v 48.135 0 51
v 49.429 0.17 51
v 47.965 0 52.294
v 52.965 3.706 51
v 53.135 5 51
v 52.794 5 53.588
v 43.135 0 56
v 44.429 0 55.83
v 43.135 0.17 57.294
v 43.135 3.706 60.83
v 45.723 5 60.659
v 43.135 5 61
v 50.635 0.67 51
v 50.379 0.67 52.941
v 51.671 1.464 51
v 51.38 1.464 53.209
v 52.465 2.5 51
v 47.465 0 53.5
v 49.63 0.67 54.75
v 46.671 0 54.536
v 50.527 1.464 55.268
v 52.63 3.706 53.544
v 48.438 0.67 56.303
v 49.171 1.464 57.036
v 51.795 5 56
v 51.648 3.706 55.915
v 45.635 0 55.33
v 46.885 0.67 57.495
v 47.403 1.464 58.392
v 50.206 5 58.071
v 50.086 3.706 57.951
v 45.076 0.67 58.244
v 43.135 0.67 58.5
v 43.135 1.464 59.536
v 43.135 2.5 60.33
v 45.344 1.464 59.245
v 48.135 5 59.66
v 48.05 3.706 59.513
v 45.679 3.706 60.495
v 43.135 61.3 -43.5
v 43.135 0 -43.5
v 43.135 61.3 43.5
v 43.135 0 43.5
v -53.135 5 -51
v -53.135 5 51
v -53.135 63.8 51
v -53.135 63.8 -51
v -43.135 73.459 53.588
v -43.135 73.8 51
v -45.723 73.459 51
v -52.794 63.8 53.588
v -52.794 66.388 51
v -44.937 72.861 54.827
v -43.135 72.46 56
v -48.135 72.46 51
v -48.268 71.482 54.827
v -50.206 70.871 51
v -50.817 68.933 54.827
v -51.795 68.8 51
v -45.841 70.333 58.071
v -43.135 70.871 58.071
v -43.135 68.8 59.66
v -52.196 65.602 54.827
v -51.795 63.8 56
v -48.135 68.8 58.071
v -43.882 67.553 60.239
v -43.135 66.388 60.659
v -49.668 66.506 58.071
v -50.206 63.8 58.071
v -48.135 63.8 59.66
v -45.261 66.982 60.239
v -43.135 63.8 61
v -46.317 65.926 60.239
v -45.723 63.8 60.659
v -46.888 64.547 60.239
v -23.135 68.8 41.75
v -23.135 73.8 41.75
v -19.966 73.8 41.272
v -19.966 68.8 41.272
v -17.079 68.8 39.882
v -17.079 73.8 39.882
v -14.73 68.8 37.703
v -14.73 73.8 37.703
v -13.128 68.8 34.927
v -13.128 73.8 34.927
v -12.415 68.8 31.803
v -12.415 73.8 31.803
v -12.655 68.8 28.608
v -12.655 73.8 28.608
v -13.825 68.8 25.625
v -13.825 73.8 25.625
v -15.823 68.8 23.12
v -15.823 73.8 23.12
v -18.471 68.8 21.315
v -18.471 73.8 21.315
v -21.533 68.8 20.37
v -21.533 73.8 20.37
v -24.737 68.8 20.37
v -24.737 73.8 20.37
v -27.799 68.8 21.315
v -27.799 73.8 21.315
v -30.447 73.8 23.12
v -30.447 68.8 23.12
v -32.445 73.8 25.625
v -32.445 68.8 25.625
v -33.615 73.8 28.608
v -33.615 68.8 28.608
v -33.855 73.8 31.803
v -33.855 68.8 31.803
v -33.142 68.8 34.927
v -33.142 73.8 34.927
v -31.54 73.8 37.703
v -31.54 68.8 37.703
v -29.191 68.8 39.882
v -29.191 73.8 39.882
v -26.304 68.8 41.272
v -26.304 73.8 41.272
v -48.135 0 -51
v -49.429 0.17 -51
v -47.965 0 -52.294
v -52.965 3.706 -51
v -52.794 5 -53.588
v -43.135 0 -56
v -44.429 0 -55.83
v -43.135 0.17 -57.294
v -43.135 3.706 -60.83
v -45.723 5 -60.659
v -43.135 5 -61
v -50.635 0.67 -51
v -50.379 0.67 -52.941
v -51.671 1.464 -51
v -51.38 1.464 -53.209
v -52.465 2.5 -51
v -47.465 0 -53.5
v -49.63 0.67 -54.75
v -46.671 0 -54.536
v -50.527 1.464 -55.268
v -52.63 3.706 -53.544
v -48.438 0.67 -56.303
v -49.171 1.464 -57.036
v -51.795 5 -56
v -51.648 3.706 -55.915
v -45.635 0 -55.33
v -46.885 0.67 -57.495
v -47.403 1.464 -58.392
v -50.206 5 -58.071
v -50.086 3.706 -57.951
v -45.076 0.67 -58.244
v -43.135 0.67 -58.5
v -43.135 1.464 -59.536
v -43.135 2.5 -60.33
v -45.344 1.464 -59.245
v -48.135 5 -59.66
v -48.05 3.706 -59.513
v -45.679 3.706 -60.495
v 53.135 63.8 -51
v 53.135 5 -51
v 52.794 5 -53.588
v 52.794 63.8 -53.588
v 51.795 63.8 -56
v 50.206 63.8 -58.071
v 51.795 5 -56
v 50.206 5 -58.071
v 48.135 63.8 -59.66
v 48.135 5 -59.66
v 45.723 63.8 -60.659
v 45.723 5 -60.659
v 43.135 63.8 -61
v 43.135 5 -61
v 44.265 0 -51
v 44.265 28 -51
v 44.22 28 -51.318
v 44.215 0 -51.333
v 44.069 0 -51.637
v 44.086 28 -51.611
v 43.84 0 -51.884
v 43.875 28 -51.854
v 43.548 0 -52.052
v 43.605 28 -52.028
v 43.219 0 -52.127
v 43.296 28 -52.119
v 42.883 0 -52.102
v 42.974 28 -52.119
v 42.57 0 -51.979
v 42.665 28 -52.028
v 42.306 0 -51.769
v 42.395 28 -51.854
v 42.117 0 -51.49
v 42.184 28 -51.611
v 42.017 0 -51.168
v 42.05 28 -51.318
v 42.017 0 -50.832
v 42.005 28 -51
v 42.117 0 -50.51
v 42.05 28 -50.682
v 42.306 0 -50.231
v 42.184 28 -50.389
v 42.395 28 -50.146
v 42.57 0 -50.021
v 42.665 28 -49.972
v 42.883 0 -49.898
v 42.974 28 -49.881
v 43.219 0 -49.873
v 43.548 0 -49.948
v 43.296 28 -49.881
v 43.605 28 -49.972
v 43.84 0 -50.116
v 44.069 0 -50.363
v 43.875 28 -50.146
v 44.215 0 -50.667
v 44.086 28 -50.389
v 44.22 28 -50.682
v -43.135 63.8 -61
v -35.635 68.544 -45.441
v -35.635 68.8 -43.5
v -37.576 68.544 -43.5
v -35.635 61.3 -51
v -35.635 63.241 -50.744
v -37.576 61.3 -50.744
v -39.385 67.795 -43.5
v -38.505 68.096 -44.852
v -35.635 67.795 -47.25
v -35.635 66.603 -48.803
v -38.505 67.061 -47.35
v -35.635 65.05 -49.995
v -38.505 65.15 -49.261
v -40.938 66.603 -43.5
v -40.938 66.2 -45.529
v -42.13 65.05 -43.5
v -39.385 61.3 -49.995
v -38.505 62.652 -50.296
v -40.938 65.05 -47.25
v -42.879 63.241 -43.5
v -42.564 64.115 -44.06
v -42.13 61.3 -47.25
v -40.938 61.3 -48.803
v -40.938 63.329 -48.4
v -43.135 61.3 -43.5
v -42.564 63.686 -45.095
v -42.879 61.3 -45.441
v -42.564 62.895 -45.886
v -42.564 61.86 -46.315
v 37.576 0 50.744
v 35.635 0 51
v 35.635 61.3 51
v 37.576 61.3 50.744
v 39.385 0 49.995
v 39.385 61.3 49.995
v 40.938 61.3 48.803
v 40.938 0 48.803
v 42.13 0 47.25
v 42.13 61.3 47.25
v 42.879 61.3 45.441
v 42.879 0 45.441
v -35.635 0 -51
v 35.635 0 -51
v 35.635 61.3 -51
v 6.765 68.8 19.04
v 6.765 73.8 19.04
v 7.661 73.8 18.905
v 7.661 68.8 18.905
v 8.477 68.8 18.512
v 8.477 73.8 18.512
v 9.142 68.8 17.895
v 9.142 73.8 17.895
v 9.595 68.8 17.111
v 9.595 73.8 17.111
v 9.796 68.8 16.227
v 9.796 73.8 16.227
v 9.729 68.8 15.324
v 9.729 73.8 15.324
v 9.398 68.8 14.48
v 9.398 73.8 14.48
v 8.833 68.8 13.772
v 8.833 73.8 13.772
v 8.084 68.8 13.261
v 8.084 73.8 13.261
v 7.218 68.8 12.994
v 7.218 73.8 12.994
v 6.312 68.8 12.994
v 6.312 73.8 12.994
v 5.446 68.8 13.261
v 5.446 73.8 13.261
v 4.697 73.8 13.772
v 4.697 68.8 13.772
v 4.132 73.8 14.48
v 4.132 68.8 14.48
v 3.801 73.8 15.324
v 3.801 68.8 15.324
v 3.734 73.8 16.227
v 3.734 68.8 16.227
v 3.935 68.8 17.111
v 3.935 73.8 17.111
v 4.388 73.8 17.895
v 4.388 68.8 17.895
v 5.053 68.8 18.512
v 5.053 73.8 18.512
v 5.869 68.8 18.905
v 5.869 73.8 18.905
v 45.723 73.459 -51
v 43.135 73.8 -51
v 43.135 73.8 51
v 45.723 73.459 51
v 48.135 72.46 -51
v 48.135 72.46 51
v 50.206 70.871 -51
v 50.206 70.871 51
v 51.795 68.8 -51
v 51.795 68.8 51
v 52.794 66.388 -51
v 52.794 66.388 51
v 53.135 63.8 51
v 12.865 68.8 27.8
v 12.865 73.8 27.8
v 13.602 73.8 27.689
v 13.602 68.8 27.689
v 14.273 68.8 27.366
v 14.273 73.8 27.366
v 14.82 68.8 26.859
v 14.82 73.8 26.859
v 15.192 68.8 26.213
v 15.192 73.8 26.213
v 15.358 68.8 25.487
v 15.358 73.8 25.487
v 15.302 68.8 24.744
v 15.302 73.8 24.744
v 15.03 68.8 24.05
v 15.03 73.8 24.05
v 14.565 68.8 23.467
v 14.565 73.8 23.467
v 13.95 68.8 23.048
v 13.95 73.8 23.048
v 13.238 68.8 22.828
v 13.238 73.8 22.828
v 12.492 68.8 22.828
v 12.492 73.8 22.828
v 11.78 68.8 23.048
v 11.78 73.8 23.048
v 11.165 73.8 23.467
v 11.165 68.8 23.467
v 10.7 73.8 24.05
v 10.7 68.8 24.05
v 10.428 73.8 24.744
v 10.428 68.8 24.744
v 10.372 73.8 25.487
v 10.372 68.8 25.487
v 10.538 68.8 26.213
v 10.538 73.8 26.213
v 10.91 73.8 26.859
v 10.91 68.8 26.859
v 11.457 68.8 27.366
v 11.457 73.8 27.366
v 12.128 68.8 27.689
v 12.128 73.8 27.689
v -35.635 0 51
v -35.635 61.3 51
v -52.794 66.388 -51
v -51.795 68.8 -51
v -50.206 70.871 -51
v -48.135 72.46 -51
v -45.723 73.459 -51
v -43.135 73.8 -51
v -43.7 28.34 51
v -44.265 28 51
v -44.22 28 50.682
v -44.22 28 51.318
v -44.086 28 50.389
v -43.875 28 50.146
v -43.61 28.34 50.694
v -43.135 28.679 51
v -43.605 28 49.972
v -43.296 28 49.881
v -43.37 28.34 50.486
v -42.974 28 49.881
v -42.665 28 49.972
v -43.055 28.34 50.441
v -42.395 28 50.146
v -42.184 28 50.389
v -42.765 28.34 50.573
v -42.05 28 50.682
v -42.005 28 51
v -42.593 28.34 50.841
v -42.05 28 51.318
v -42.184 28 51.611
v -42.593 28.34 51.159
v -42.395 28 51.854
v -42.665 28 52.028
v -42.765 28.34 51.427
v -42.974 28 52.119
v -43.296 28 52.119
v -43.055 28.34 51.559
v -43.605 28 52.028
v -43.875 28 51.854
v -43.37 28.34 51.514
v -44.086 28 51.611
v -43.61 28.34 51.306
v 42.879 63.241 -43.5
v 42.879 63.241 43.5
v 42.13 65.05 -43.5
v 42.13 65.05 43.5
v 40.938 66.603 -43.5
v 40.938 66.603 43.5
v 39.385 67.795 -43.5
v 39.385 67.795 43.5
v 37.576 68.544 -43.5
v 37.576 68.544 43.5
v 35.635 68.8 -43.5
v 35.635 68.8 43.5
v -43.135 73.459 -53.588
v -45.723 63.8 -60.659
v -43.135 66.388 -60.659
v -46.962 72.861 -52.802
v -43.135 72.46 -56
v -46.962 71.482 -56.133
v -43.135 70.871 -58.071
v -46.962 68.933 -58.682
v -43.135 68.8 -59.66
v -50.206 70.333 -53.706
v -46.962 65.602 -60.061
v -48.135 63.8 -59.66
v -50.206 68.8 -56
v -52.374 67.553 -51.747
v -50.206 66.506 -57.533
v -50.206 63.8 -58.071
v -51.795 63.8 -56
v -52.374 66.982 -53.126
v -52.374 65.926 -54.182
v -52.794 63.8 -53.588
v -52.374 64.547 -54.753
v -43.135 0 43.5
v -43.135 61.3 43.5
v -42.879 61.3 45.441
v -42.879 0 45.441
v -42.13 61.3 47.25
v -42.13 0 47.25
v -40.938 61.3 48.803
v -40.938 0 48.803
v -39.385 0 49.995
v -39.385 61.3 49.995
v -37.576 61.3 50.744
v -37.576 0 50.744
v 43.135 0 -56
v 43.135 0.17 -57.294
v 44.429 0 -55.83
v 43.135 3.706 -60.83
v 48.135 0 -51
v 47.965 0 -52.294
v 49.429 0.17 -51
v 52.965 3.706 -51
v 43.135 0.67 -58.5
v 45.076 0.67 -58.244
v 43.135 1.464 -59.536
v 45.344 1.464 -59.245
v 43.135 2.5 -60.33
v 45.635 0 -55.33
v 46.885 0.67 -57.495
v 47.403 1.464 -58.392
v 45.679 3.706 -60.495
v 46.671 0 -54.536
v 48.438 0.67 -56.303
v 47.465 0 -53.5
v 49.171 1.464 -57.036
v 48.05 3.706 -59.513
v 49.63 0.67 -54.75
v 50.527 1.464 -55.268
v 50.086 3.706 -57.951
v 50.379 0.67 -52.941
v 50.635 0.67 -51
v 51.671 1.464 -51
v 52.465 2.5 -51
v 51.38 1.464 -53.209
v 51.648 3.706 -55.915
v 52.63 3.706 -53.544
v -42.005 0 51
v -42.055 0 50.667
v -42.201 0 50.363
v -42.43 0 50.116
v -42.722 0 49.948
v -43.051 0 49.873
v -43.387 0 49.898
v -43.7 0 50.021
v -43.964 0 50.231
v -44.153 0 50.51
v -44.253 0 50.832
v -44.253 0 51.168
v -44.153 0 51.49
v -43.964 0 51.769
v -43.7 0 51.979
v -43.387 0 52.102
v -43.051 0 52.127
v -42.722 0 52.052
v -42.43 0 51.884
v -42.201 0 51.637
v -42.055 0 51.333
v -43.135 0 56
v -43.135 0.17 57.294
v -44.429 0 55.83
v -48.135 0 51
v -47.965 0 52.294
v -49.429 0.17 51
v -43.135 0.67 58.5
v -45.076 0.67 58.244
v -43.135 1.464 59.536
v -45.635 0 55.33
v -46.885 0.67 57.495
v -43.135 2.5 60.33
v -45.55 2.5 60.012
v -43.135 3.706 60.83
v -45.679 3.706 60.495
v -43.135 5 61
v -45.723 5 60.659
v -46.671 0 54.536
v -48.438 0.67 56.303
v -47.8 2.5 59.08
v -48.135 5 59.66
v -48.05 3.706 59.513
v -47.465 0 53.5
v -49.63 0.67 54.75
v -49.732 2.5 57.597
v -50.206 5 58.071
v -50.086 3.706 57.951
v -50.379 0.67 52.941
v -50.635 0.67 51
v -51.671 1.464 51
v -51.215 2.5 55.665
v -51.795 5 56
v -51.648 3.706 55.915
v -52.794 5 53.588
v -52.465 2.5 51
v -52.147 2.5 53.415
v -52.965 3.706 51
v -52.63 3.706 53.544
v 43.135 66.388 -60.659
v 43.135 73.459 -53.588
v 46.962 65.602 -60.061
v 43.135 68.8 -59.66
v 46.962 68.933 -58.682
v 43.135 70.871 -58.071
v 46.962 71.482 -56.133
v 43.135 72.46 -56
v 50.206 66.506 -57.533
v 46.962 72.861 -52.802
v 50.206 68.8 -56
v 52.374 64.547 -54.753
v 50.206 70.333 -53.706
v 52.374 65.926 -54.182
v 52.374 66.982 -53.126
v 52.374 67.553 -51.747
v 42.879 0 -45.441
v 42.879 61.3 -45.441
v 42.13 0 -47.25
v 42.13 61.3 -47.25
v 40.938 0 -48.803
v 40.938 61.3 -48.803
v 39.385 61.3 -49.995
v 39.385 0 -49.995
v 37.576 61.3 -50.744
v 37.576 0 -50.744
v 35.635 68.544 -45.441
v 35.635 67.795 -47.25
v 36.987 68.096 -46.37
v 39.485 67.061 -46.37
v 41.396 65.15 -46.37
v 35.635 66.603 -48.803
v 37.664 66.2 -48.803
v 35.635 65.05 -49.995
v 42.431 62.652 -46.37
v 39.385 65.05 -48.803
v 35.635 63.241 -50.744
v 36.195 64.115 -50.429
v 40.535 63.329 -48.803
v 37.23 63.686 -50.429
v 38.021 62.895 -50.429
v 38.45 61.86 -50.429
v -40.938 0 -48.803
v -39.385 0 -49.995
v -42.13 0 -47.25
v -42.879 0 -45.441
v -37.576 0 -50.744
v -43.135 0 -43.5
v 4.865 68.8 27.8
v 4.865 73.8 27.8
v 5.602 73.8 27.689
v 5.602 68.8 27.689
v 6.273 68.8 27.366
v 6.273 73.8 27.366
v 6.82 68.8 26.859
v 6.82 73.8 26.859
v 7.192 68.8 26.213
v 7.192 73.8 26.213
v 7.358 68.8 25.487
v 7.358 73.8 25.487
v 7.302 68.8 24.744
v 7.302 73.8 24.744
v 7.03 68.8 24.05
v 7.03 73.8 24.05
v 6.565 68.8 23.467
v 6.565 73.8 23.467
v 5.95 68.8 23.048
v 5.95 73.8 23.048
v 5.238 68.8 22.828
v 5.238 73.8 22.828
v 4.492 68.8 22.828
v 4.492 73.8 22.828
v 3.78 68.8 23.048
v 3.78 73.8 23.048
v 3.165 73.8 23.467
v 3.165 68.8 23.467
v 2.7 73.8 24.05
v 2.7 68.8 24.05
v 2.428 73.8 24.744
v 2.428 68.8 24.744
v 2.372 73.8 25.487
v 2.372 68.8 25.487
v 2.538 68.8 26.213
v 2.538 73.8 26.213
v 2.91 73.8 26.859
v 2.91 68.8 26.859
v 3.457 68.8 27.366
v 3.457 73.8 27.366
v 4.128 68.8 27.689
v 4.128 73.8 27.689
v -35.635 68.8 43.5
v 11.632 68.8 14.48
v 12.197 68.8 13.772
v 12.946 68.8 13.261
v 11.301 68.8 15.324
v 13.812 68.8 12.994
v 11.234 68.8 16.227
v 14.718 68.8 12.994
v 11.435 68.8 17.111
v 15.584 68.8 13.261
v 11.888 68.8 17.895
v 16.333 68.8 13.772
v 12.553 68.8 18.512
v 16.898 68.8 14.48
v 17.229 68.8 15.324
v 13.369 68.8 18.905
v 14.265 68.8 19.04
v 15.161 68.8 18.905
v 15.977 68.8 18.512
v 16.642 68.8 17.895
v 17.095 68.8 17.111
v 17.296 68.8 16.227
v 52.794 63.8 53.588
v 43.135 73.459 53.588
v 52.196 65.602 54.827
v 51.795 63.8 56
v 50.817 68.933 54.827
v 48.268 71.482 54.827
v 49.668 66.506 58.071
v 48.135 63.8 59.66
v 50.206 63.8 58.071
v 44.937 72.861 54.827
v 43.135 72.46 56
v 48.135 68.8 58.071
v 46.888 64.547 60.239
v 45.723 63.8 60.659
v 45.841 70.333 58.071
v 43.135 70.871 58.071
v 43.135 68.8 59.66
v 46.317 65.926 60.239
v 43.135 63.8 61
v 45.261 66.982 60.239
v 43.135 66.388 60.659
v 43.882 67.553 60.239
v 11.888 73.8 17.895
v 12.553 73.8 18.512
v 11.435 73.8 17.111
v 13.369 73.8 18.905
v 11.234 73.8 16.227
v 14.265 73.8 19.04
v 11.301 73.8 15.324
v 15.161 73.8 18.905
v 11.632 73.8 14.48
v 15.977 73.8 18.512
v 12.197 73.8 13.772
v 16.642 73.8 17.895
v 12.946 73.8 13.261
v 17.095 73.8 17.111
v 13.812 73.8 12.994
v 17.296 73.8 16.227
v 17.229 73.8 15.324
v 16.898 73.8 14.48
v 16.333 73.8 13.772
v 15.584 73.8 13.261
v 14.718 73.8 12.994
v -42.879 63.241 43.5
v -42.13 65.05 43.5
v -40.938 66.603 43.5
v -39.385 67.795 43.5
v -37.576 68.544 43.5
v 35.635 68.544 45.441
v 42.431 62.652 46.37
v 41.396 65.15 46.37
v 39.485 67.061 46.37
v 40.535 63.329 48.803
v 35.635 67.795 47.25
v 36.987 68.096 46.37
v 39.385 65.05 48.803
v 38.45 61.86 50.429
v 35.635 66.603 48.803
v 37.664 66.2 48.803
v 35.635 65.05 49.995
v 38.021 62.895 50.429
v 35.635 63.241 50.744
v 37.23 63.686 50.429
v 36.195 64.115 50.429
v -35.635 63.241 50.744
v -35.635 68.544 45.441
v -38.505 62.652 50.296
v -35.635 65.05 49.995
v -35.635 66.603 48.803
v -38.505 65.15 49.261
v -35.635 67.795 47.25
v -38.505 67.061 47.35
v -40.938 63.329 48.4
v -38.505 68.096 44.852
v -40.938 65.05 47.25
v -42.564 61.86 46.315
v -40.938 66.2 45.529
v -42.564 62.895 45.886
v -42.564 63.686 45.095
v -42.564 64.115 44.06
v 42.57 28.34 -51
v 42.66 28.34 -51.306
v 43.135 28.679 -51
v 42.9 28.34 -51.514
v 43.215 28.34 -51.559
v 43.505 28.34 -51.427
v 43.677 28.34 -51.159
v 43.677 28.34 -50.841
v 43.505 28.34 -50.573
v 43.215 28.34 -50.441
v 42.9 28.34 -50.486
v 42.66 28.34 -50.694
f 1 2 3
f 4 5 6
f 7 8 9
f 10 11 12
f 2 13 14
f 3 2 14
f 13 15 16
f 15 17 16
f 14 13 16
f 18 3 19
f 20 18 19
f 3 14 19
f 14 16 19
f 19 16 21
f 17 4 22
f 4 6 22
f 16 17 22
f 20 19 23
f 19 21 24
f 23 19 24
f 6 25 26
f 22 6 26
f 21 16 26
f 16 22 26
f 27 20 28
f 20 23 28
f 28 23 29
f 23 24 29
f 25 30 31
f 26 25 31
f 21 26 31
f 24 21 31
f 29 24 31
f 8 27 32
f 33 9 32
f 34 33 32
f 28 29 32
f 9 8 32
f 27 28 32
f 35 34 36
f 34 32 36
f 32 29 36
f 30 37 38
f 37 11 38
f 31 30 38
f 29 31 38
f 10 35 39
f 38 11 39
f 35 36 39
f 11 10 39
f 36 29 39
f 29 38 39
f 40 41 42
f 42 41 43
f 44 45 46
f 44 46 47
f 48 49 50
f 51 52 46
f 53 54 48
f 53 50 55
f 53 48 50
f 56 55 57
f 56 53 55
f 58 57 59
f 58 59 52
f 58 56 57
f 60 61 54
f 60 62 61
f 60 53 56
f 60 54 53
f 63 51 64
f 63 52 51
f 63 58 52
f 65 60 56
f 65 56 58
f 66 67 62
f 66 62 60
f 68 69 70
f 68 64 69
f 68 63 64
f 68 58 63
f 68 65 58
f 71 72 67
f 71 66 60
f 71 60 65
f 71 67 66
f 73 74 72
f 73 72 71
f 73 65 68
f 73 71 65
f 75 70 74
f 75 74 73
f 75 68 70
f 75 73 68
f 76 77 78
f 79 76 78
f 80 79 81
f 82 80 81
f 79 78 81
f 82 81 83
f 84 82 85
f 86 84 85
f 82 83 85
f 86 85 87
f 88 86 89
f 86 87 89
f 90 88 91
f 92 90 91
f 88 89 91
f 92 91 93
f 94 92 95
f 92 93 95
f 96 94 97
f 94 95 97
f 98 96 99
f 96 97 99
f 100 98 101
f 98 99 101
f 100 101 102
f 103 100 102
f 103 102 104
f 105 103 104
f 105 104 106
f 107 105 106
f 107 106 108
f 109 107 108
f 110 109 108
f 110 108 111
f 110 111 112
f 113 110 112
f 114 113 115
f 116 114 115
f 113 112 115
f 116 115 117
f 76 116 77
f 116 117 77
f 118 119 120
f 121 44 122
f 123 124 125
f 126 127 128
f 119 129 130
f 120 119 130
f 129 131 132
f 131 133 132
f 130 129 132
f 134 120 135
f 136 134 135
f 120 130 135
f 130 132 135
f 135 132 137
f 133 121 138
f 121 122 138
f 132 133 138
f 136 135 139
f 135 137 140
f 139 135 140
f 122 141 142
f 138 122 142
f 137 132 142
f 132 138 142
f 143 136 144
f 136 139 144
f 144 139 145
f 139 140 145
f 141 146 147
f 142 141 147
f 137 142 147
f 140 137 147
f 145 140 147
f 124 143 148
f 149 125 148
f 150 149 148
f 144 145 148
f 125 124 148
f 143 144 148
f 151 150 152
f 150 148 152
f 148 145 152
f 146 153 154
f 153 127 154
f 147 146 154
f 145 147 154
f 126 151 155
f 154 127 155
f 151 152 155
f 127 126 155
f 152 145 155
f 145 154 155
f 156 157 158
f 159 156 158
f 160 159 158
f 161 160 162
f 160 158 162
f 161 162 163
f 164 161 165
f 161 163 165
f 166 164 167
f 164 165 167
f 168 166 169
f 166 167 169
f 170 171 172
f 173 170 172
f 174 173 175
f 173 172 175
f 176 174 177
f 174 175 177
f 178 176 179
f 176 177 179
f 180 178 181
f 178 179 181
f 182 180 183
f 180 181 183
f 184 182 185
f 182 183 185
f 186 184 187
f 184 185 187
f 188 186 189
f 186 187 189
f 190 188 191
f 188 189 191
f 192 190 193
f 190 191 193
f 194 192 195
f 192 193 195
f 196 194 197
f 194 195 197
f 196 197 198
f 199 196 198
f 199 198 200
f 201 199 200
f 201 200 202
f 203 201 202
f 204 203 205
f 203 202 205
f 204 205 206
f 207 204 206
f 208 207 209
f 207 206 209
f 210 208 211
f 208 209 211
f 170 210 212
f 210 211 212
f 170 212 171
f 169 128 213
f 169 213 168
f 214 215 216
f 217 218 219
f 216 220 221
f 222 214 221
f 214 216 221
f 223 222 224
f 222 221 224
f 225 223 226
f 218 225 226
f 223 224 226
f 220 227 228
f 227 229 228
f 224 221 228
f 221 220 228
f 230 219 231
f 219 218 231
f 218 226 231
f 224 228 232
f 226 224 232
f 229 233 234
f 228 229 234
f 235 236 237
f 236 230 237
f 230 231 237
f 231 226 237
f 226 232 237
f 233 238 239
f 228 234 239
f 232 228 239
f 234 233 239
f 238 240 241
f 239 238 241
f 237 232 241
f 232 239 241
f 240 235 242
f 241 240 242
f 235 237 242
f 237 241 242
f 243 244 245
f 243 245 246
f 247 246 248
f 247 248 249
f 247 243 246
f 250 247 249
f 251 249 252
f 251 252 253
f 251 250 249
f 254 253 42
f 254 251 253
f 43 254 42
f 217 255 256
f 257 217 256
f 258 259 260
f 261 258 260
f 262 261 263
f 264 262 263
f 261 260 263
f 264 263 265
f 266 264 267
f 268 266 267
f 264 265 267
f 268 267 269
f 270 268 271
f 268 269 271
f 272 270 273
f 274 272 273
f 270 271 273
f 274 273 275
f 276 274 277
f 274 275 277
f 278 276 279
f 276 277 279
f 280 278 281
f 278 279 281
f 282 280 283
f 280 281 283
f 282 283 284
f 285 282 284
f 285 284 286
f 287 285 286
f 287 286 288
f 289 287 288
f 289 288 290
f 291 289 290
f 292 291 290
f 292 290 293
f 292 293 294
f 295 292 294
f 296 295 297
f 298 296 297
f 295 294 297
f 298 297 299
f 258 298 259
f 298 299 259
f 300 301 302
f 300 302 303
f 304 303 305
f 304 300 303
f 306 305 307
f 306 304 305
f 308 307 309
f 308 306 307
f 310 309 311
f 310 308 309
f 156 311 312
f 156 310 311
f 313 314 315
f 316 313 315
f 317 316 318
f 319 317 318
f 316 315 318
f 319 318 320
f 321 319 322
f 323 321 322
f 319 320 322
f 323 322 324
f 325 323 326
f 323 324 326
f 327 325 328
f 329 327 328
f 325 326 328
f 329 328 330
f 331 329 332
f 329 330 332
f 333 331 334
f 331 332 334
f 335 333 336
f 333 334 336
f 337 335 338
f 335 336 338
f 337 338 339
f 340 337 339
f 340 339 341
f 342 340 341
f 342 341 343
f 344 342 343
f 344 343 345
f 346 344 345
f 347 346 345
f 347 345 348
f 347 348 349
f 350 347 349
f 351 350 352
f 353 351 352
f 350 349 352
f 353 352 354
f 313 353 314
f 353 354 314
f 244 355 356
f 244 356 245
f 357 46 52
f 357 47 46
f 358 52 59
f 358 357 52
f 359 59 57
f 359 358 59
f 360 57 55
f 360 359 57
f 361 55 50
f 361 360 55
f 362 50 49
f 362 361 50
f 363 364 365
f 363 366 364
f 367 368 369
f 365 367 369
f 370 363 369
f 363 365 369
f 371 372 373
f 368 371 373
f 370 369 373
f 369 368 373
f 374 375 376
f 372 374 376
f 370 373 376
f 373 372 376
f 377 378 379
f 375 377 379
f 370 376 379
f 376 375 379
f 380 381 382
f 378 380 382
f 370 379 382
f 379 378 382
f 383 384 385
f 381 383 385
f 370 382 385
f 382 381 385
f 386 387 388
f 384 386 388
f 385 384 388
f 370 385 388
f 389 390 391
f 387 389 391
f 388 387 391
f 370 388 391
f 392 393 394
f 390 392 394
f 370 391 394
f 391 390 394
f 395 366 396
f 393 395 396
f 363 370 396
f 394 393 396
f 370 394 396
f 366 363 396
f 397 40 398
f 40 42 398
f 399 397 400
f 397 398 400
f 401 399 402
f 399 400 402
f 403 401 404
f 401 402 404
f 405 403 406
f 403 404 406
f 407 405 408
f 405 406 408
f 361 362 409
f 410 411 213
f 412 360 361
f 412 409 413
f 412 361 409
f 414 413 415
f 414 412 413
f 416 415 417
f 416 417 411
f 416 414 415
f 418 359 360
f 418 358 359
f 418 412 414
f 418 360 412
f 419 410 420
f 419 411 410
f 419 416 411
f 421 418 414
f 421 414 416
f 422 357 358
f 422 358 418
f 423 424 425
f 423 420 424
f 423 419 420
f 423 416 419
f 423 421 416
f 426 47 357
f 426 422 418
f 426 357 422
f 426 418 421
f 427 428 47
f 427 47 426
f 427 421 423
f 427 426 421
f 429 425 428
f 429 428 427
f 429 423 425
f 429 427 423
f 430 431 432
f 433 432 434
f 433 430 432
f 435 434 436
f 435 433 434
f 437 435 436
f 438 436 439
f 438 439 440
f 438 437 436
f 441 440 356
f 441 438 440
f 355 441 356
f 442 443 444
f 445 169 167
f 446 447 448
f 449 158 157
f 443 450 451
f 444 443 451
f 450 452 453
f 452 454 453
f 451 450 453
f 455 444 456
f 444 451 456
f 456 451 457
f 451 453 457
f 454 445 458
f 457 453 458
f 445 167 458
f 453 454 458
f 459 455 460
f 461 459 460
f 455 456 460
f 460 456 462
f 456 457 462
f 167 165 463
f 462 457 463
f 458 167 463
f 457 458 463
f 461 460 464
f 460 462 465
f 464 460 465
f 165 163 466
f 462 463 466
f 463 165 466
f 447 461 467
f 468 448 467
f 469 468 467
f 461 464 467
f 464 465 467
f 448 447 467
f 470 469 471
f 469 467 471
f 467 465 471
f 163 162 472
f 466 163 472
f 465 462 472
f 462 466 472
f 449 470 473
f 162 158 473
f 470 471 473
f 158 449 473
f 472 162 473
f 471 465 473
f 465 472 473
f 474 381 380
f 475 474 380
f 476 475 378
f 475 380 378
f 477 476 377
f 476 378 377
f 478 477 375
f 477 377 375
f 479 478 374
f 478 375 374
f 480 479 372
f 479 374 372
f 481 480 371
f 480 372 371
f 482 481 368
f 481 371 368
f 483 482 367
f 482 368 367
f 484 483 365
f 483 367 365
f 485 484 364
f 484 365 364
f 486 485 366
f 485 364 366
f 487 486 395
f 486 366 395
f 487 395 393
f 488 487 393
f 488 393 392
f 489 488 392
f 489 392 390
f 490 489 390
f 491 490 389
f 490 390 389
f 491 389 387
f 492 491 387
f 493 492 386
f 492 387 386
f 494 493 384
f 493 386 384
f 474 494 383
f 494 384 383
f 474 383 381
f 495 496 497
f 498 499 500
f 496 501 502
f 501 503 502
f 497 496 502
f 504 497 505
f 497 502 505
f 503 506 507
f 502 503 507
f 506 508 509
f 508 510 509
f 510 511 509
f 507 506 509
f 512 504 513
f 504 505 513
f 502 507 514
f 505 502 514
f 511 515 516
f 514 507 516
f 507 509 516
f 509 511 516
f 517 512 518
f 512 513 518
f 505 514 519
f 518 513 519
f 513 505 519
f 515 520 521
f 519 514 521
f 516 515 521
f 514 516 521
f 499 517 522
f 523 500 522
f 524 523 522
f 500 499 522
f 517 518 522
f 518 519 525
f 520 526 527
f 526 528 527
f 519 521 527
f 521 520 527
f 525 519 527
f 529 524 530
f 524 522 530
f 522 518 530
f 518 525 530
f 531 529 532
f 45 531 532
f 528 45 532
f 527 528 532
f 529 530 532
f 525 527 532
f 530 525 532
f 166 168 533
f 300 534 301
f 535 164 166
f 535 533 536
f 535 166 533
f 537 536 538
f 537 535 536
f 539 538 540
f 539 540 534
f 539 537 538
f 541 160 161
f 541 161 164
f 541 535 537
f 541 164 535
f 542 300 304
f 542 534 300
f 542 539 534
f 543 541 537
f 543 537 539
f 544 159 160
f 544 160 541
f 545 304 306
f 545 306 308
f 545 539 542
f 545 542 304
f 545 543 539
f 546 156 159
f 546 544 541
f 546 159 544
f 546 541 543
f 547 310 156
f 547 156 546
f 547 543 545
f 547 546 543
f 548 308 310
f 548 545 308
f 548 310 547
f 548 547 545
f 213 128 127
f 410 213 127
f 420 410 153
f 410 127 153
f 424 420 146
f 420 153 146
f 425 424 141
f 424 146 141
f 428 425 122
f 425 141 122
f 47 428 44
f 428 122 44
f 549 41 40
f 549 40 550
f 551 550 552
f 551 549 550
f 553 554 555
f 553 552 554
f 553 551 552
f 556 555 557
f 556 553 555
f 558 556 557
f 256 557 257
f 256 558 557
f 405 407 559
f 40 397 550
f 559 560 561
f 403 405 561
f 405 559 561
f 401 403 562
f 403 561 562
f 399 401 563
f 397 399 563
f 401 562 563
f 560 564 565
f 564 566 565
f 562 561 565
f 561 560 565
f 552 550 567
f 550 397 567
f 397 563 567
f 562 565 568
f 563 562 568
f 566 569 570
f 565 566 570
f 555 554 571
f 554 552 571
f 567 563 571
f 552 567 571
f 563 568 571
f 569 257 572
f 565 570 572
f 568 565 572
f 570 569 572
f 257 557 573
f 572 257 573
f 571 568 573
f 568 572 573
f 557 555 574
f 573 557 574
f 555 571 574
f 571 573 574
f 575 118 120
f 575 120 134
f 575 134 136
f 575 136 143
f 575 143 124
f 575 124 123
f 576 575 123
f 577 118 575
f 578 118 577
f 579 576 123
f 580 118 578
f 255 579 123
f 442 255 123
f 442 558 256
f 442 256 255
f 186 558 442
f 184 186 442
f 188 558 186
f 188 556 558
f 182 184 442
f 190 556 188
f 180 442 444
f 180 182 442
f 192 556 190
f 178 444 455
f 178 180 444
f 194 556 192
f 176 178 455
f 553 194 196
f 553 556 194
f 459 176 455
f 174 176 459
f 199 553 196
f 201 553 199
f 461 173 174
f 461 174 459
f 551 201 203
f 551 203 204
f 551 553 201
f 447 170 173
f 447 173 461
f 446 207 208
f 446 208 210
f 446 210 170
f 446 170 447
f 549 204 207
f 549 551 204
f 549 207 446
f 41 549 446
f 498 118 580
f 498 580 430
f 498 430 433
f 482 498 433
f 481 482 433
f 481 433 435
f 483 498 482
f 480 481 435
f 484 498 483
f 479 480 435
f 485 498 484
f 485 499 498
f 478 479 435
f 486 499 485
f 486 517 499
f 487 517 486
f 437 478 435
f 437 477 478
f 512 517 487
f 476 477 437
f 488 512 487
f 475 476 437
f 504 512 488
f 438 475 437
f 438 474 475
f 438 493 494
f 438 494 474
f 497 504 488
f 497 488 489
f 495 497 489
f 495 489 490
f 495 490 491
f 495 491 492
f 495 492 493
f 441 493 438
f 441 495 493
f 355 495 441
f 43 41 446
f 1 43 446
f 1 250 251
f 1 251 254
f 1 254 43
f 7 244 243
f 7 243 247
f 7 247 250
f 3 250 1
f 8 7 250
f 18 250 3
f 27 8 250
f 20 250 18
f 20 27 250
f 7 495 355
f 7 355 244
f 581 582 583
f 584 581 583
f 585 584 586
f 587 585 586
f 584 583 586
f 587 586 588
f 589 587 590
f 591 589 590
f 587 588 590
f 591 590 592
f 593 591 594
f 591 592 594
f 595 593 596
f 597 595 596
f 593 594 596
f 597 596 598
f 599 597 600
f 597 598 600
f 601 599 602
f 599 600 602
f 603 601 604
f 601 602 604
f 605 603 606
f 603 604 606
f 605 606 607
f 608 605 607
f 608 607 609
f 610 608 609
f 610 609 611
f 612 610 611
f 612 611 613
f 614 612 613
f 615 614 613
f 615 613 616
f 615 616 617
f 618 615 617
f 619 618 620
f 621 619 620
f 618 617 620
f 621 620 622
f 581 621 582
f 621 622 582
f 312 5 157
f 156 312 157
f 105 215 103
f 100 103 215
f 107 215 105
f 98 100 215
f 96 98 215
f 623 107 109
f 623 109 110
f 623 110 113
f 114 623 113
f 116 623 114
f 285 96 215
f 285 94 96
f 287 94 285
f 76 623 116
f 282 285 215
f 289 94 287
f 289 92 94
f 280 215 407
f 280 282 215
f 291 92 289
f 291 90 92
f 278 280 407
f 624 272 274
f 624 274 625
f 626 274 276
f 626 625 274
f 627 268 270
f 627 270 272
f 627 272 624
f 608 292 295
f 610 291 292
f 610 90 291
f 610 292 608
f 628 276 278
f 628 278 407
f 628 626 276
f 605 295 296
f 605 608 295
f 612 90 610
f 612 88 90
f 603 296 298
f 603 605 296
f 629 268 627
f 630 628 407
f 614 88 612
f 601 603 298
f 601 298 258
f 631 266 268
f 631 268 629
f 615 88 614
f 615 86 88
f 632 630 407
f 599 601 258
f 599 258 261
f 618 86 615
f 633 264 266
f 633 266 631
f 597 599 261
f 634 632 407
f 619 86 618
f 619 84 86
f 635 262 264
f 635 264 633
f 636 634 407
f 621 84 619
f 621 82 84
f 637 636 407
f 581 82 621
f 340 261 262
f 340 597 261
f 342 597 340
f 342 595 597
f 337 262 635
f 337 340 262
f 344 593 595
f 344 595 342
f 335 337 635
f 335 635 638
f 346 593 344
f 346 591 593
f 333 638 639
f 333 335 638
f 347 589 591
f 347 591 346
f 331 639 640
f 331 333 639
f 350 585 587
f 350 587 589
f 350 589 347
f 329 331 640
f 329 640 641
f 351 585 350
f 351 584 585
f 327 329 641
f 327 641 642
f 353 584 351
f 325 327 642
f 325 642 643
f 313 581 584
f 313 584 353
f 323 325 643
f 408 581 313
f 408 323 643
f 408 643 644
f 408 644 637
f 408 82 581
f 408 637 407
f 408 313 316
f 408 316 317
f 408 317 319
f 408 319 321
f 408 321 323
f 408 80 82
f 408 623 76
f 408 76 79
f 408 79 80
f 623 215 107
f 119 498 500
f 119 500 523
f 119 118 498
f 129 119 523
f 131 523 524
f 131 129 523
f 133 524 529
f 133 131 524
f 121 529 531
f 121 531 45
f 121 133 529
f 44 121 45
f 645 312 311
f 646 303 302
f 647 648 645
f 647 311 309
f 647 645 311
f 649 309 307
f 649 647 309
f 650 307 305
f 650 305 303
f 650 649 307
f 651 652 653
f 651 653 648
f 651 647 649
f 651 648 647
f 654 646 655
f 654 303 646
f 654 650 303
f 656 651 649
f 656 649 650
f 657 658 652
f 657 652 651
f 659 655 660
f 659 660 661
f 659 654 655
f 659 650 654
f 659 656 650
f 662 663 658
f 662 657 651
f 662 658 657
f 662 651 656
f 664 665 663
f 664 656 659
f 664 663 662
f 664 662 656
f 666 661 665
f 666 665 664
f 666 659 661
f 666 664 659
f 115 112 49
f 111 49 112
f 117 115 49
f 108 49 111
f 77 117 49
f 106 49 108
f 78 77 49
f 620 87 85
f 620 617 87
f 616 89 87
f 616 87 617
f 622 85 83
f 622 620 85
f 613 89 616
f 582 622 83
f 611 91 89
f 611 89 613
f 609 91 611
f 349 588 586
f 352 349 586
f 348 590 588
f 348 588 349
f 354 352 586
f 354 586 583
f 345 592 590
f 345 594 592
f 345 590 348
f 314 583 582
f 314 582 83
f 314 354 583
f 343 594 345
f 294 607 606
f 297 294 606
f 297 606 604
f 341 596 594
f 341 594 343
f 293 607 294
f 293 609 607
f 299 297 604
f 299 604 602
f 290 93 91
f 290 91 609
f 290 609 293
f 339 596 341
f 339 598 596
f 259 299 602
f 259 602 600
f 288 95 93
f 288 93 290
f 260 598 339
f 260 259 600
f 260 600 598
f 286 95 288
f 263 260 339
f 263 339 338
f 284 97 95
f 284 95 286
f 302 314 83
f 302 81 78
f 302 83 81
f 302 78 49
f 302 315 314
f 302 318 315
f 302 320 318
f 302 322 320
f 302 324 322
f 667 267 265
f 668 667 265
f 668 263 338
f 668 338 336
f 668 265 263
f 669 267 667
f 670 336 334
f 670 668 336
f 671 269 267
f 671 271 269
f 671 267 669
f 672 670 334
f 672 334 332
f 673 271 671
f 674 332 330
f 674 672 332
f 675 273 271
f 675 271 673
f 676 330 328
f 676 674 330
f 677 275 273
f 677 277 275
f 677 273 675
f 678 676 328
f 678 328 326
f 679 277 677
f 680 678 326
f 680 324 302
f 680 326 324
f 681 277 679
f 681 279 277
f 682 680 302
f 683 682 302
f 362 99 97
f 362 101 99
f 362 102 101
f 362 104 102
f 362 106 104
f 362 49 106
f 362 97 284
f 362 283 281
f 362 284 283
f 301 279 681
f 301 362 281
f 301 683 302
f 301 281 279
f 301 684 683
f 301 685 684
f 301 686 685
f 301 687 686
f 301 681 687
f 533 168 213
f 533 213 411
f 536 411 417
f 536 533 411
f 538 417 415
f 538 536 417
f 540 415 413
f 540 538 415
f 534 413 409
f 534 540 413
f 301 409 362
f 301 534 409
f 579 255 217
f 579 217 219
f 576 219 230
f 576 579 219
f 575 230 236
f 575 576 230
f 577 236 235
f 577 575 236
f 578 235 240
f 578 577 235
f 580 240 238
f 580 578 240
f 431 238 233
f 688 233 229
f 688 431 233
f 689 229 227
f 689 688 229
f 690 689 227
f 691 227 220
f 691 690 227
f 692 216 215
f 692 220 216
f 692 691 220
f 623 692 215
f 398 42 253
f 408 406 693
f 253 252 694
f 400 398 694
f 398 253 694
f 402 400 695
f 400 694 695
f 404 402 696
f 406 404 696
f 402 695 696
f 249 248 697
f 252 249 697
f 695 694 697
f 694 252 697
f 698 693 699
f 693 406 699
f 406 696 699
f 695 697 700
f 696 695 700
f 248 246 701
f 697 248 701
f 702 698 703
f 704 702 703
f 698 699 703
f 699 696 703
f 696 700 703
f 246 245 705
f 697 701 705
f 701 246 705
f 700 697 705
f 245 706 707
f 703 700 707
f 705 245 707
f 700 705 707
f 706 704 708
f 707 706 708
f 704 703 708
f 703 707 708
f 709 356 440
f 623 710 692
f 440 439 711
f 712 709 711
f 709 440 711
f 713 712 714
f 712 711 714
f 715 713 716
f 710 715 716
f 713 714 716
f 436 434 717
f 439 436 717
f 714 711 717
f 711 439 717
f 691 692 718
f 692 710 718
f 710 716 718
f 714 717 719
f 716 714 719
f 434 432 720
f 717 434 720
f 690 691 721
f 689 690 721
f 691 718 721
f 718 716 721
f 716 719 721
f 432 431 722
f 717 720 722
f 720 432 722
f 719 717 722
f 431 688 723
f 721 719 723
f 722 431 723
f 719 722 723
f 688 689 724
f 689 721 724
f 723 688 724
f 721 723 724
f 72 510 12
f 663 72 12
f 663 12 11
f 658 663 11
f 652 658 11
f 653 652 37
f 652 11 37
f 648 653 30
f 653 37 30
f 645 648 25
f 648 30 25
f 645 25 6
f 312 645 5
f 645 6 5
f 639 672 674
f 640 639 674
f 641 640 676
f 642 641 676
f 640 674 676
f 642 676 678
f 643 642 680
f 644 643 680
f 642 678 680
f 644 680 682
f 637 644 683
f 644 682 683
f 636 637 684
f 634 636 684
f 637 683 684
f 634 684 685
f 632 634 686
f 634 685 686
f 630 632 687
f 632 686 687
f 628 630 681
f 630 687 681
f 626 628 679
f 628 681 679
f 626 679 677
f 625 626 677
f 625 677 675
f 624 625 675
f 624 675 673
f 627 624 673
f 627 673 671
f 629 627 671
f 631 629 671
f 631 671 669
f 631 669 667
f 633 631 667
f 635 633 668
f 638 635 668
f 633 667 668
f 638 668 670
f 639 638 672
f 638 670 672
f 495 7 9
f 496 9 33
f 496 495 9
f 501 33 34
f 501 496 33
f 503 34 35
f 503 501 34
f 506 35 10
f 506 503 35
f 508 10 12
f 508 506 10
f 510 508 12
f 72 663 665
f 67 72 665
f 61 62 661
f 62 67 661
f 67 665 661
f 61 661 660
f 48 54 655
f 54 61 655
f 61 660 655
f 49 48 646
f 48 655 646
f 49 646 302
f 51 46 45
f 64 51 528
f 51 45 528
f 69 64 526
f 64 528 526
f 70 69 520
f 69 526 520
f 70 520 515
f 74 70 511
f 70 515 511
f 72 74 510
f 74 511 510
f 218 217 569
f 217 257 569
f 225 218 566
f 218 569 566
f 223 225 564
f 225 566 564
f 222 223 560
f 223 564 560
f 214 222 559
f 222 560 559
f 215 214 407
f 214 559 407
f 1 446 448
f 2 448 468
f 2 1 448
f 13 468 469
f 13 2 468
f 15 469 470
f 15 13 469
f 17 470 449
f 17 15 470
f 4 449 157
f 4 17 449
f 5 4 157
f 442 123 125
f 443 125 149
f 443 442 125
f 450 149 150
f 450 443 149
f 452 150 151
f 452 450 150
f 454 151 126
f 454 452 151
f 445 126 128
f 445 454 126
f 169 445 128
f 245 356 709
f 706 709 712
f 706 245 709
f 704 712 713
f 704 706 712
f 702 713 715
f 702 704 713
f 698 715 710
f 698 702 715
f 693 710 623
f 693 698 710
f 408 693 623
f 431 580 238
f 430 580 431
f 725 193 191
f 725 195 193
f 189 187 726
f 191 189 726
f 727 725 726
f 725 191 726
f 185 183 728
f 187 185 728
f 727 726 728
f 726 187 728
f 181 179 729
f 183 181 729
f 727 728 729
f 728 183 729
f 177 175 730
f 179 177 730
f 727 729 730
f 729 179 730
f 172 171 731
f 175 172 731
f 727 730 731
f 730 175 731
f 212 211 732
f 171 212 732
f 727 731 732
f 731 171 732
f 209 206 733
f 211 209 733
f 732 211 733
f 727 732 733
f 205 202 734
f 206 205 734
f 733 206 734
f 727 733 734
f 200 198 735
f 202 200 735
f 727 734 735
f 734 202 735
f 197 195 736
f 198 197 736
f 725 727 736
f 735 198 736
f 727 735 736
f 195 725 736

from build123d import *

# Parameters (mm, degrees)
SKETCH1_W                       = 106.27
SKETCH1_H                       = 122
BOSS_EXTRUDE1_DEPTH             = 73.8
SKETCH2_W                       = 86.27
SKETCH2_H                       = 102
CUT_EXTRUDE1_DEPTH              = 68.8
FILLET1_R                       = 10
FILLET2_R                       = 10
FILLET3_R                       = 7.5
FILLET4_R                       = 7.5
FILLET6_R                       = 5
SKETCH3_R                       = 3.04
CUT_EXTRUDE2_DEPTH              = 5
SKETCH4_R                       = 10.75
CUT_EXTRUDE3_DEPTH              = 5
SKETCH5_R                       = 2.5
CUT_EXTRUDE4_DEPTH              = 5
F_4_40_TAPPED_HOLE3_D           = 2.2606
F_4_40_TAPPED_HOLE3_DEPTH       = 30
F_4_40_TAPPED_HOLE3_CSINK_D     = 4.1148
F_4_40_TAPPED_HOLE3_CSINK_ANGLE = 100
F_4_40_TAPPED_HOLE3_TIP         = 0.679152758
F_4_40_TAPPED_HOLE4_D           = 2.2606
F_4_40_TAPPED_HOLE4_DEPTH       = 30
F_4_40_TAPPED_HOLE4_CSINK_D     = 4.1148
F_4_40_TAPPED_HOLE4_CSINK_ANGLE = 100
F_4_40_TAPPED_HOLE4_TIP         = 0.679152758


with BuildPart() as part:
    # Sketch1 → Boss-Extrude1 (new body)
    with BuildSketch(Plane(origin=(0, 0, 0), x_dir=(1, 0, 0), z_dir=(0, 1, 0))):
        Rectangle(SKETCH1_W, SKETCH1_H)
    extrude(amount=BOSS_EXTRUDE1_DEPTH)

    # Sketch2 → Cut-Extrude1 (cut)
    with BuildSketch(Plane.XZ):
        Rectangle(SKETCH2_W, SKETCH2_H)
    extrude(amount=-CUT_EXTRUDE1_DEPTH, mode=Mode.SUBTRACT)

    # Fillet1
    fillet1_edges = [part.edges().sort_by_distance(p)[0] for p in [
        (-53.135, 73.8, 0),
        (0, 73.8, 61),
        (53.135, 73.8, 0),
        (0, 73.8, -61),
    ]]
    fillet(fillet1_edges, radius=FILLET1_R)

    # Fillet2
    # the kernel refuses this fillet: 10 mm, written as the material it takes off along each edge
    with BuildSketch(Plane(origin=(43.135, 63.8, 51), x_dir=(1, 0, 0), z_dir=(0, 0, 1))) as fillet2_piece_1_section:
        Polygon((0, 0), (FILLET2_R, 0), (FILLET2_R, FILLET2_R), (0, FILLET2_R), align=None)
    fillet2_piece_1 = extrude(amount=FILLET2_R, mode=Mode.PRIVATE)
    fillet2_piece_1 = fillet2_piece_1 - Plane(origin=(43.135, 63.8, 51), x_dir=(-0.7071067811865475, -0.7071067811865475, 0), z_dir=(0, 0, 1)) * Sphere(FILLET2_R, mode=Mode.PRIVATE)
    add(fillet2_piece_1, mode=Mode.SUBTRACT)
    with BuildSketch(Plane(origin=(-43.135, 63.8, 51), x_dir=(-1, 0, 0), z_dir=(0, 0, 1))) as fillet2_piece_2_section:
        Polygon((0, 0), (FILLET2_R, 0), (FILLET2_R, -FILLET2_R), (0, -FILLET2_R), align=None)
    fillet2_piece_2 = extrude(amount=FILLET2_R, mode=Mode.PRIVATE)
    fillet2_piece_2 = fillet2_piece_2 - Plane(origin=(-43.135, 63.8, 51), x_dir=(0.7071067811865475, -0.7071067811865475, 0), z_dir=(0, 0, 1)) * Sphere(FILLET2_R, mode=Mode.PRIVATE)
    add(fillet2_piece_2, mode=Mode.SUBTRACT)
    with BuildSketch(Plane(origin=(43.135, 63.8, -51), x_dir=(0, 0, -1), z_dir=(1, 0, 0))) as fillet2_piece_3_section:
        Polygon((0, 0), (FILLET2_R, 0), (FILLET2_R, FILLET2_R), (0, FILLET2_R), align=None)
    fillet2_piece_3 = extrude(amount=FILLET2_R, mode=Mode.PRIVATE)
    fillet2_piece_3 = fillet2_piece_3 - Plane(origin=(43.135, 63.8, -51), x_dir=(0, -0.7071067811865475, 0.7071067811865475), z_dir=(1, 0, 0)) * Sphere(FILLET2_R, mode=Mode.PRIVATE)
    add(fillet2_piece_3, mode=Mode.SUBTRACT)
    with BuildSketch(Plane(origin=(-43.135, 63.8, -51), x_dir=(0, 0, -1), z_dir=(-1, 0, 0))) as fillet2_piece_4_section:
        Polygon((0, 0), (FILLET2_R, 0), (FILLET2_R, -FILLET2_R), (0, -FILLET2_R), align=None)
    fillet2_piece_4 = extrude(amount=FILLET2_R, mode=Mode.PRIVATE)
    fillet2_piece_4 = fillet2_piece_4 - Plane(origin=(-43.135, 63.8, -51), x_dir=(0, -0.7071067811865475, 0.7071067811865475), z_dir=(-1, 0, 0)) * Sphere(FILLET2_R, mode=Mode.PRIVATE)
    add(fillet2_piece_4, mode=Mode.SUBTRACT)
    with BuildSketch(Plane(origin=(-53.135, -25, -61), x_dir=(0, 0, 1), z_dir=(0, 1, 0)), Plane(origin=(-53.135, -25, 61), x_dir=(1, 0, 0), z_dir=(0, 1, 0))) as fillet2_piece_5:
        with BuildLine():
            CenterArc((FILLET2_R, FILLET2_R), FILLET2_R, 180, 90)
            Line((0, FILLET2_R), (0, 0))
            Line((0, 0), (FILLET2_R, 0))
        make_face()
    extrude(amount=88.8, mode=Mode.SUBTRACT)
    with BuildSketch(Plane(origin=(53.135, -25, -61), x_dir=(0, 0, 1), z_dir=(0, 1, 0)), Plane(origin=(53.135, -25, 61), x_dir=(-1, 0, 0), z_dir=(0, 1, 0))) as fillet2_piece_6:
        with BuildLine():
            CenterArc((FILLET2_R, -FILLET2_R), FILLET2_R, 90, 90)
            Line((0, -FILLET2_R), (0, 0))
            Line((0, 0), (FILLET2_R, 0))
        make_face()
    extrude(amount=88.8, mode=Mode.SUBTRACT)

    # Fillet3
    fillet3_edges = [part.edges().sort_by_distance(p)[0] for p in [
        (43.135, 68.8, 0),
        (0, 68.8, -51),
        (-43.135, 68.8, 0),
        (0, 68.8, 51),
    ]]
    fillet(fillet3_edges, radius=FILLET3_R)

    # Fillet4
    # the kernel refuses this fillet: 7.5 mm, written as the material it adds along each edge
    with BuildSketch(Plane(origin=(-35.635, 61.3, -43.5), x_dir=(0, 0, -1), z_dir=(-1, 0, 0))) as fillet4_piece_1_section:
        Polygon((0, 0), (FILLET4_R, 0), (FILLET4_R, -FILLET4_R), (0, -FILLET4_R), align=None)
    fillet4_piece_1 = extrude(amount=FILLET4_R, mode=Mode.PRIVATE)
    fillet4_piece_1 = fillet4_piece_1 - Plane(origin=(-35.635, 61.3, -43.5), x_dir=(0, -0.7071067811865475, 0.7071067811865475), z_dir=(-1, 0, 0)) * Sphere(FILLET4_R, mode=Mode.PRIVATE)
    add(fillet4_piece_1)
    with BuildSketch(Plane(origin=(-35.635, 61.3, 43.5), x_dir=(0, 0, 1), z_dir=(-1, 0, 0))) as fillet4_piece_2_section:
        Polygon((0, 0), (FILLET4_R, 0), (FILLET4_R, FILLET4_R), (0, FILLET4_R), align=None)
    fillet4_piece_2 = extrude(amount=FILLET4_R, mode=Mode.PRIVATE)
    fillet4_piece_2 = fillet4_piece_2 - Plane(origin=(-35.635, 61.3, 43.5), x_dir=(0, -0.7071067811865475, -0.7071067811865475), z_dir=(-1, 0, 0)) * Sphere(FILLET4_R, mode=Mode.PRIVATE)
    add(fillet4_piece_2)
    with BuildSketch(Plane(origin=(35.635, 61.3, -43.5), x_dir=(1, 0, 0), z_dir=(0, 0, -1))) as fillet4_piece_3_section:
        Polygon((0, 0), (FILLET4_R, 0), (FILLET4_R, -FILLET4_R), (0, -FILLET4_R), align=None)
    fillet4_piece_3 = extrude(amount=FILLET4_R, mode=Mode.PRIVATE)
    fillet4_piece_3 = fillet4_piece_3 - Plane(origin=(35.635, 61.3, -43.5), x_dir=(-0.7071067811865475, -0.7071067811865475, 0), z_dir=(0, 0, -1)) * Sphere(FILLET4_R, mode=Mode.PRIVATE)
    add(fillet4_piece_3)
    with BuildSketch(Plane(origin=(35.635, 61.3, 43.5), x_dir=(1, 0, 0), z_dir=(0, 0, 1))) as fillet4_piece_4_section:
        Polygon((0, 0), (FILLET4_R, 0), (FILLET4_R, FILLET4_R), (0, FILLET4_R), align=None)
    fillet4_piece_4 = extrude(amount=FILLET4_R, mode=Mode.PRIVATE)
    fillet4_piece_4 = fillet4_piece_4 - Plane(origin=(35.635, 61.3, 43.5), x_dir=(-0.7071067811865475, -0.7071067811865475, 0), z_dir=(0, 0, 1)) * Sphere(FILLET4_R, mode=Mode.PRIVATE)
    add(fillet4_piece_4)
    with BuildSketch(Plane(origin=(43.135, 0, 51), x_dir=(-1, 0, 0), z_dir=(0, 1, 0)), Plane(origin=(-43.135, 0, 51), x_dir=(0, 0, -1), z_dir=(0, 1, 0))) as fillet4_piece_5:
        with BuildLine():
            CenterArc((FILLET4_R, -FILLET4_R), FILLET4_R, 90, 90)
            Line((0, -FILLET4_R), (0, 0))
            Line((0, 0), (FILLET4_R, 0))
        make_face()
    extrude(amount=61.3)
    with BuildSketch(Plane(origin=(43.135, 0, -51), x_dir=(-1, 0, 0), z_dir=(0, 1, 0)), Plane(origin=(-43.135, 0, -51), x_dir=(0, 0, 1), z_dir=(0, 1, 0))) as fillet4_piece_6:
        with BuildLine():
            CenterArc((FILLET4_R, FILLET4_R), FILLET4_R, 180, 90)
            Line((0, FILLET4_R), (0, 0))
            Line((0, 0), (FILLET4_R, 0))
        make_face()
    extrude(amount=61.3)

    # Fillet6
    fillet6_edges = [part.edges().sort_by_distance(p)[0] for p in [
        (-53.135, 0, 0),
        (53.135, 0, 0),
        (0, 0, 61),
        (0, 0, -61),
        (-50.206067812, 0, 58.071067812),
        (50.206067812, 0, 58.071067812),
        (50.206067812, 0, -58.071067812),
        (-50.206067812, 0, -58.071067812),
    ]]
    fillet(fillet6_edges, radius=FILLET6_R)

    # Sketch3 → Cut-Extrude2 (cut)
    with BuildSketch(Plane(origin=(0, 73.8, 0), x_dir=(1, 0, 0), z_dir=(0, 1, 0))):
        with Locations(Location((14.265, -16, 0), (0, 0, 270))):
            Circle(SKETCH3_R)
        with Locations(Location((6.765, -16, 0), (0, 0, 270))):
            Circle(SKETCH3_R)
    extrude(amount=-CUT_EXTRUDE2_DEPTH, mode=Mode.SUBTRACT)

    # Sketch4 → Cut-Extrude3 (cut)
    with BuildSketch(Plane(origin=(0, 73.8, 0), x_dir=(1, 0, 0), z_dir=(0, 1, 0))):
        with Locations(Location((-23.135, -31, 0), (0, 0, 270))):
            Circle(SKETCH4_R)
    extrude(amount=-CUT_EXTRUDE3_DEPTH, mode=Mode.SUBTRACT)

    # Sketch5 → Cut-Extrude4 (cut)
    with BuildSketch(Plane(origin=(0, 73.8, 0), x_dir=(1, 0, 0), z_dir=(0, 1, 0))):
        with Locations(Location((4.865, -25.3, 0), (0, 0, 270))):
            Circle(SKETCH5_R)
        with Locations(Location((12.865, -25.3, 0), (0, 0, 270))):
            Circle(SKETCH5_R)
    extrude(amount=-CUT_EXTRUDE4_DEPTH, mode=Mode.SUBTRACT)

    # #4-40 Tapped Hole3
    with Locations(Plane(origin=(100.412065725, -2, -32.702388863), x_dir=(-1, 0, 0), z_dir=(0, -1, 0))):
        with Locations((143.547065725, -83.702388863)):
            CounterSinkHole(F_4_40_TAPPED_HOLE3_D / 2, F_4_40_TAPPED_HOLE3_CSINK_D / 2, depth=F_4_40_TAPPED_HOLE3_DEPTH, counter_sink_angle=F_4_40_TAPPED_HOLE3_CSINK_ANGLE)
            with Locations((0, 0, -(F_4_40_TAPPED_HOLE3_DEPTH + F_4_40_TAPPED_HOLE3_TIP / 2))):  # 118° drill point
                Cone(0, F_4_40_TAPPED_HOLE3_D / 2, F_4_40_TAPPED_HOLE3_TIP, mode=Mode.SUBTRACT)

    # #4-40 Tapped Hole4
    with Locations(Plane(origin=(100.412065725, -2, -32.702388863), x_dir=(-1, 0, 0), z_dir=(0, -1, 0))):
        with Locations((57.277065725, 18.297611137)):
            CounterSinkHole(F_4_40_TAPPED_HOLE4_D / 2, F_4_40_TAPPED_HOLE4_CSINK_D / 2, depth=F_4_40_TAPPED_HOLE4_DEPTH, counter_sink_angle=F_4_40_TAPPED_HOLE4_CSINK_ANGLE)
            with Locations((0, 0, -(F_4_40_TAPPED_HOLE4_DEPTH + F_4_40_TAPPED_HOLE4_TIP / 2))):  # 118° drill point
                Cone(0, F_4_40_TAPPED_HOLE4_D / 2, F_4_40_TAPPED_HOLE4_TIP, mode=Mode.SUBTRACT)


solid = part.part
